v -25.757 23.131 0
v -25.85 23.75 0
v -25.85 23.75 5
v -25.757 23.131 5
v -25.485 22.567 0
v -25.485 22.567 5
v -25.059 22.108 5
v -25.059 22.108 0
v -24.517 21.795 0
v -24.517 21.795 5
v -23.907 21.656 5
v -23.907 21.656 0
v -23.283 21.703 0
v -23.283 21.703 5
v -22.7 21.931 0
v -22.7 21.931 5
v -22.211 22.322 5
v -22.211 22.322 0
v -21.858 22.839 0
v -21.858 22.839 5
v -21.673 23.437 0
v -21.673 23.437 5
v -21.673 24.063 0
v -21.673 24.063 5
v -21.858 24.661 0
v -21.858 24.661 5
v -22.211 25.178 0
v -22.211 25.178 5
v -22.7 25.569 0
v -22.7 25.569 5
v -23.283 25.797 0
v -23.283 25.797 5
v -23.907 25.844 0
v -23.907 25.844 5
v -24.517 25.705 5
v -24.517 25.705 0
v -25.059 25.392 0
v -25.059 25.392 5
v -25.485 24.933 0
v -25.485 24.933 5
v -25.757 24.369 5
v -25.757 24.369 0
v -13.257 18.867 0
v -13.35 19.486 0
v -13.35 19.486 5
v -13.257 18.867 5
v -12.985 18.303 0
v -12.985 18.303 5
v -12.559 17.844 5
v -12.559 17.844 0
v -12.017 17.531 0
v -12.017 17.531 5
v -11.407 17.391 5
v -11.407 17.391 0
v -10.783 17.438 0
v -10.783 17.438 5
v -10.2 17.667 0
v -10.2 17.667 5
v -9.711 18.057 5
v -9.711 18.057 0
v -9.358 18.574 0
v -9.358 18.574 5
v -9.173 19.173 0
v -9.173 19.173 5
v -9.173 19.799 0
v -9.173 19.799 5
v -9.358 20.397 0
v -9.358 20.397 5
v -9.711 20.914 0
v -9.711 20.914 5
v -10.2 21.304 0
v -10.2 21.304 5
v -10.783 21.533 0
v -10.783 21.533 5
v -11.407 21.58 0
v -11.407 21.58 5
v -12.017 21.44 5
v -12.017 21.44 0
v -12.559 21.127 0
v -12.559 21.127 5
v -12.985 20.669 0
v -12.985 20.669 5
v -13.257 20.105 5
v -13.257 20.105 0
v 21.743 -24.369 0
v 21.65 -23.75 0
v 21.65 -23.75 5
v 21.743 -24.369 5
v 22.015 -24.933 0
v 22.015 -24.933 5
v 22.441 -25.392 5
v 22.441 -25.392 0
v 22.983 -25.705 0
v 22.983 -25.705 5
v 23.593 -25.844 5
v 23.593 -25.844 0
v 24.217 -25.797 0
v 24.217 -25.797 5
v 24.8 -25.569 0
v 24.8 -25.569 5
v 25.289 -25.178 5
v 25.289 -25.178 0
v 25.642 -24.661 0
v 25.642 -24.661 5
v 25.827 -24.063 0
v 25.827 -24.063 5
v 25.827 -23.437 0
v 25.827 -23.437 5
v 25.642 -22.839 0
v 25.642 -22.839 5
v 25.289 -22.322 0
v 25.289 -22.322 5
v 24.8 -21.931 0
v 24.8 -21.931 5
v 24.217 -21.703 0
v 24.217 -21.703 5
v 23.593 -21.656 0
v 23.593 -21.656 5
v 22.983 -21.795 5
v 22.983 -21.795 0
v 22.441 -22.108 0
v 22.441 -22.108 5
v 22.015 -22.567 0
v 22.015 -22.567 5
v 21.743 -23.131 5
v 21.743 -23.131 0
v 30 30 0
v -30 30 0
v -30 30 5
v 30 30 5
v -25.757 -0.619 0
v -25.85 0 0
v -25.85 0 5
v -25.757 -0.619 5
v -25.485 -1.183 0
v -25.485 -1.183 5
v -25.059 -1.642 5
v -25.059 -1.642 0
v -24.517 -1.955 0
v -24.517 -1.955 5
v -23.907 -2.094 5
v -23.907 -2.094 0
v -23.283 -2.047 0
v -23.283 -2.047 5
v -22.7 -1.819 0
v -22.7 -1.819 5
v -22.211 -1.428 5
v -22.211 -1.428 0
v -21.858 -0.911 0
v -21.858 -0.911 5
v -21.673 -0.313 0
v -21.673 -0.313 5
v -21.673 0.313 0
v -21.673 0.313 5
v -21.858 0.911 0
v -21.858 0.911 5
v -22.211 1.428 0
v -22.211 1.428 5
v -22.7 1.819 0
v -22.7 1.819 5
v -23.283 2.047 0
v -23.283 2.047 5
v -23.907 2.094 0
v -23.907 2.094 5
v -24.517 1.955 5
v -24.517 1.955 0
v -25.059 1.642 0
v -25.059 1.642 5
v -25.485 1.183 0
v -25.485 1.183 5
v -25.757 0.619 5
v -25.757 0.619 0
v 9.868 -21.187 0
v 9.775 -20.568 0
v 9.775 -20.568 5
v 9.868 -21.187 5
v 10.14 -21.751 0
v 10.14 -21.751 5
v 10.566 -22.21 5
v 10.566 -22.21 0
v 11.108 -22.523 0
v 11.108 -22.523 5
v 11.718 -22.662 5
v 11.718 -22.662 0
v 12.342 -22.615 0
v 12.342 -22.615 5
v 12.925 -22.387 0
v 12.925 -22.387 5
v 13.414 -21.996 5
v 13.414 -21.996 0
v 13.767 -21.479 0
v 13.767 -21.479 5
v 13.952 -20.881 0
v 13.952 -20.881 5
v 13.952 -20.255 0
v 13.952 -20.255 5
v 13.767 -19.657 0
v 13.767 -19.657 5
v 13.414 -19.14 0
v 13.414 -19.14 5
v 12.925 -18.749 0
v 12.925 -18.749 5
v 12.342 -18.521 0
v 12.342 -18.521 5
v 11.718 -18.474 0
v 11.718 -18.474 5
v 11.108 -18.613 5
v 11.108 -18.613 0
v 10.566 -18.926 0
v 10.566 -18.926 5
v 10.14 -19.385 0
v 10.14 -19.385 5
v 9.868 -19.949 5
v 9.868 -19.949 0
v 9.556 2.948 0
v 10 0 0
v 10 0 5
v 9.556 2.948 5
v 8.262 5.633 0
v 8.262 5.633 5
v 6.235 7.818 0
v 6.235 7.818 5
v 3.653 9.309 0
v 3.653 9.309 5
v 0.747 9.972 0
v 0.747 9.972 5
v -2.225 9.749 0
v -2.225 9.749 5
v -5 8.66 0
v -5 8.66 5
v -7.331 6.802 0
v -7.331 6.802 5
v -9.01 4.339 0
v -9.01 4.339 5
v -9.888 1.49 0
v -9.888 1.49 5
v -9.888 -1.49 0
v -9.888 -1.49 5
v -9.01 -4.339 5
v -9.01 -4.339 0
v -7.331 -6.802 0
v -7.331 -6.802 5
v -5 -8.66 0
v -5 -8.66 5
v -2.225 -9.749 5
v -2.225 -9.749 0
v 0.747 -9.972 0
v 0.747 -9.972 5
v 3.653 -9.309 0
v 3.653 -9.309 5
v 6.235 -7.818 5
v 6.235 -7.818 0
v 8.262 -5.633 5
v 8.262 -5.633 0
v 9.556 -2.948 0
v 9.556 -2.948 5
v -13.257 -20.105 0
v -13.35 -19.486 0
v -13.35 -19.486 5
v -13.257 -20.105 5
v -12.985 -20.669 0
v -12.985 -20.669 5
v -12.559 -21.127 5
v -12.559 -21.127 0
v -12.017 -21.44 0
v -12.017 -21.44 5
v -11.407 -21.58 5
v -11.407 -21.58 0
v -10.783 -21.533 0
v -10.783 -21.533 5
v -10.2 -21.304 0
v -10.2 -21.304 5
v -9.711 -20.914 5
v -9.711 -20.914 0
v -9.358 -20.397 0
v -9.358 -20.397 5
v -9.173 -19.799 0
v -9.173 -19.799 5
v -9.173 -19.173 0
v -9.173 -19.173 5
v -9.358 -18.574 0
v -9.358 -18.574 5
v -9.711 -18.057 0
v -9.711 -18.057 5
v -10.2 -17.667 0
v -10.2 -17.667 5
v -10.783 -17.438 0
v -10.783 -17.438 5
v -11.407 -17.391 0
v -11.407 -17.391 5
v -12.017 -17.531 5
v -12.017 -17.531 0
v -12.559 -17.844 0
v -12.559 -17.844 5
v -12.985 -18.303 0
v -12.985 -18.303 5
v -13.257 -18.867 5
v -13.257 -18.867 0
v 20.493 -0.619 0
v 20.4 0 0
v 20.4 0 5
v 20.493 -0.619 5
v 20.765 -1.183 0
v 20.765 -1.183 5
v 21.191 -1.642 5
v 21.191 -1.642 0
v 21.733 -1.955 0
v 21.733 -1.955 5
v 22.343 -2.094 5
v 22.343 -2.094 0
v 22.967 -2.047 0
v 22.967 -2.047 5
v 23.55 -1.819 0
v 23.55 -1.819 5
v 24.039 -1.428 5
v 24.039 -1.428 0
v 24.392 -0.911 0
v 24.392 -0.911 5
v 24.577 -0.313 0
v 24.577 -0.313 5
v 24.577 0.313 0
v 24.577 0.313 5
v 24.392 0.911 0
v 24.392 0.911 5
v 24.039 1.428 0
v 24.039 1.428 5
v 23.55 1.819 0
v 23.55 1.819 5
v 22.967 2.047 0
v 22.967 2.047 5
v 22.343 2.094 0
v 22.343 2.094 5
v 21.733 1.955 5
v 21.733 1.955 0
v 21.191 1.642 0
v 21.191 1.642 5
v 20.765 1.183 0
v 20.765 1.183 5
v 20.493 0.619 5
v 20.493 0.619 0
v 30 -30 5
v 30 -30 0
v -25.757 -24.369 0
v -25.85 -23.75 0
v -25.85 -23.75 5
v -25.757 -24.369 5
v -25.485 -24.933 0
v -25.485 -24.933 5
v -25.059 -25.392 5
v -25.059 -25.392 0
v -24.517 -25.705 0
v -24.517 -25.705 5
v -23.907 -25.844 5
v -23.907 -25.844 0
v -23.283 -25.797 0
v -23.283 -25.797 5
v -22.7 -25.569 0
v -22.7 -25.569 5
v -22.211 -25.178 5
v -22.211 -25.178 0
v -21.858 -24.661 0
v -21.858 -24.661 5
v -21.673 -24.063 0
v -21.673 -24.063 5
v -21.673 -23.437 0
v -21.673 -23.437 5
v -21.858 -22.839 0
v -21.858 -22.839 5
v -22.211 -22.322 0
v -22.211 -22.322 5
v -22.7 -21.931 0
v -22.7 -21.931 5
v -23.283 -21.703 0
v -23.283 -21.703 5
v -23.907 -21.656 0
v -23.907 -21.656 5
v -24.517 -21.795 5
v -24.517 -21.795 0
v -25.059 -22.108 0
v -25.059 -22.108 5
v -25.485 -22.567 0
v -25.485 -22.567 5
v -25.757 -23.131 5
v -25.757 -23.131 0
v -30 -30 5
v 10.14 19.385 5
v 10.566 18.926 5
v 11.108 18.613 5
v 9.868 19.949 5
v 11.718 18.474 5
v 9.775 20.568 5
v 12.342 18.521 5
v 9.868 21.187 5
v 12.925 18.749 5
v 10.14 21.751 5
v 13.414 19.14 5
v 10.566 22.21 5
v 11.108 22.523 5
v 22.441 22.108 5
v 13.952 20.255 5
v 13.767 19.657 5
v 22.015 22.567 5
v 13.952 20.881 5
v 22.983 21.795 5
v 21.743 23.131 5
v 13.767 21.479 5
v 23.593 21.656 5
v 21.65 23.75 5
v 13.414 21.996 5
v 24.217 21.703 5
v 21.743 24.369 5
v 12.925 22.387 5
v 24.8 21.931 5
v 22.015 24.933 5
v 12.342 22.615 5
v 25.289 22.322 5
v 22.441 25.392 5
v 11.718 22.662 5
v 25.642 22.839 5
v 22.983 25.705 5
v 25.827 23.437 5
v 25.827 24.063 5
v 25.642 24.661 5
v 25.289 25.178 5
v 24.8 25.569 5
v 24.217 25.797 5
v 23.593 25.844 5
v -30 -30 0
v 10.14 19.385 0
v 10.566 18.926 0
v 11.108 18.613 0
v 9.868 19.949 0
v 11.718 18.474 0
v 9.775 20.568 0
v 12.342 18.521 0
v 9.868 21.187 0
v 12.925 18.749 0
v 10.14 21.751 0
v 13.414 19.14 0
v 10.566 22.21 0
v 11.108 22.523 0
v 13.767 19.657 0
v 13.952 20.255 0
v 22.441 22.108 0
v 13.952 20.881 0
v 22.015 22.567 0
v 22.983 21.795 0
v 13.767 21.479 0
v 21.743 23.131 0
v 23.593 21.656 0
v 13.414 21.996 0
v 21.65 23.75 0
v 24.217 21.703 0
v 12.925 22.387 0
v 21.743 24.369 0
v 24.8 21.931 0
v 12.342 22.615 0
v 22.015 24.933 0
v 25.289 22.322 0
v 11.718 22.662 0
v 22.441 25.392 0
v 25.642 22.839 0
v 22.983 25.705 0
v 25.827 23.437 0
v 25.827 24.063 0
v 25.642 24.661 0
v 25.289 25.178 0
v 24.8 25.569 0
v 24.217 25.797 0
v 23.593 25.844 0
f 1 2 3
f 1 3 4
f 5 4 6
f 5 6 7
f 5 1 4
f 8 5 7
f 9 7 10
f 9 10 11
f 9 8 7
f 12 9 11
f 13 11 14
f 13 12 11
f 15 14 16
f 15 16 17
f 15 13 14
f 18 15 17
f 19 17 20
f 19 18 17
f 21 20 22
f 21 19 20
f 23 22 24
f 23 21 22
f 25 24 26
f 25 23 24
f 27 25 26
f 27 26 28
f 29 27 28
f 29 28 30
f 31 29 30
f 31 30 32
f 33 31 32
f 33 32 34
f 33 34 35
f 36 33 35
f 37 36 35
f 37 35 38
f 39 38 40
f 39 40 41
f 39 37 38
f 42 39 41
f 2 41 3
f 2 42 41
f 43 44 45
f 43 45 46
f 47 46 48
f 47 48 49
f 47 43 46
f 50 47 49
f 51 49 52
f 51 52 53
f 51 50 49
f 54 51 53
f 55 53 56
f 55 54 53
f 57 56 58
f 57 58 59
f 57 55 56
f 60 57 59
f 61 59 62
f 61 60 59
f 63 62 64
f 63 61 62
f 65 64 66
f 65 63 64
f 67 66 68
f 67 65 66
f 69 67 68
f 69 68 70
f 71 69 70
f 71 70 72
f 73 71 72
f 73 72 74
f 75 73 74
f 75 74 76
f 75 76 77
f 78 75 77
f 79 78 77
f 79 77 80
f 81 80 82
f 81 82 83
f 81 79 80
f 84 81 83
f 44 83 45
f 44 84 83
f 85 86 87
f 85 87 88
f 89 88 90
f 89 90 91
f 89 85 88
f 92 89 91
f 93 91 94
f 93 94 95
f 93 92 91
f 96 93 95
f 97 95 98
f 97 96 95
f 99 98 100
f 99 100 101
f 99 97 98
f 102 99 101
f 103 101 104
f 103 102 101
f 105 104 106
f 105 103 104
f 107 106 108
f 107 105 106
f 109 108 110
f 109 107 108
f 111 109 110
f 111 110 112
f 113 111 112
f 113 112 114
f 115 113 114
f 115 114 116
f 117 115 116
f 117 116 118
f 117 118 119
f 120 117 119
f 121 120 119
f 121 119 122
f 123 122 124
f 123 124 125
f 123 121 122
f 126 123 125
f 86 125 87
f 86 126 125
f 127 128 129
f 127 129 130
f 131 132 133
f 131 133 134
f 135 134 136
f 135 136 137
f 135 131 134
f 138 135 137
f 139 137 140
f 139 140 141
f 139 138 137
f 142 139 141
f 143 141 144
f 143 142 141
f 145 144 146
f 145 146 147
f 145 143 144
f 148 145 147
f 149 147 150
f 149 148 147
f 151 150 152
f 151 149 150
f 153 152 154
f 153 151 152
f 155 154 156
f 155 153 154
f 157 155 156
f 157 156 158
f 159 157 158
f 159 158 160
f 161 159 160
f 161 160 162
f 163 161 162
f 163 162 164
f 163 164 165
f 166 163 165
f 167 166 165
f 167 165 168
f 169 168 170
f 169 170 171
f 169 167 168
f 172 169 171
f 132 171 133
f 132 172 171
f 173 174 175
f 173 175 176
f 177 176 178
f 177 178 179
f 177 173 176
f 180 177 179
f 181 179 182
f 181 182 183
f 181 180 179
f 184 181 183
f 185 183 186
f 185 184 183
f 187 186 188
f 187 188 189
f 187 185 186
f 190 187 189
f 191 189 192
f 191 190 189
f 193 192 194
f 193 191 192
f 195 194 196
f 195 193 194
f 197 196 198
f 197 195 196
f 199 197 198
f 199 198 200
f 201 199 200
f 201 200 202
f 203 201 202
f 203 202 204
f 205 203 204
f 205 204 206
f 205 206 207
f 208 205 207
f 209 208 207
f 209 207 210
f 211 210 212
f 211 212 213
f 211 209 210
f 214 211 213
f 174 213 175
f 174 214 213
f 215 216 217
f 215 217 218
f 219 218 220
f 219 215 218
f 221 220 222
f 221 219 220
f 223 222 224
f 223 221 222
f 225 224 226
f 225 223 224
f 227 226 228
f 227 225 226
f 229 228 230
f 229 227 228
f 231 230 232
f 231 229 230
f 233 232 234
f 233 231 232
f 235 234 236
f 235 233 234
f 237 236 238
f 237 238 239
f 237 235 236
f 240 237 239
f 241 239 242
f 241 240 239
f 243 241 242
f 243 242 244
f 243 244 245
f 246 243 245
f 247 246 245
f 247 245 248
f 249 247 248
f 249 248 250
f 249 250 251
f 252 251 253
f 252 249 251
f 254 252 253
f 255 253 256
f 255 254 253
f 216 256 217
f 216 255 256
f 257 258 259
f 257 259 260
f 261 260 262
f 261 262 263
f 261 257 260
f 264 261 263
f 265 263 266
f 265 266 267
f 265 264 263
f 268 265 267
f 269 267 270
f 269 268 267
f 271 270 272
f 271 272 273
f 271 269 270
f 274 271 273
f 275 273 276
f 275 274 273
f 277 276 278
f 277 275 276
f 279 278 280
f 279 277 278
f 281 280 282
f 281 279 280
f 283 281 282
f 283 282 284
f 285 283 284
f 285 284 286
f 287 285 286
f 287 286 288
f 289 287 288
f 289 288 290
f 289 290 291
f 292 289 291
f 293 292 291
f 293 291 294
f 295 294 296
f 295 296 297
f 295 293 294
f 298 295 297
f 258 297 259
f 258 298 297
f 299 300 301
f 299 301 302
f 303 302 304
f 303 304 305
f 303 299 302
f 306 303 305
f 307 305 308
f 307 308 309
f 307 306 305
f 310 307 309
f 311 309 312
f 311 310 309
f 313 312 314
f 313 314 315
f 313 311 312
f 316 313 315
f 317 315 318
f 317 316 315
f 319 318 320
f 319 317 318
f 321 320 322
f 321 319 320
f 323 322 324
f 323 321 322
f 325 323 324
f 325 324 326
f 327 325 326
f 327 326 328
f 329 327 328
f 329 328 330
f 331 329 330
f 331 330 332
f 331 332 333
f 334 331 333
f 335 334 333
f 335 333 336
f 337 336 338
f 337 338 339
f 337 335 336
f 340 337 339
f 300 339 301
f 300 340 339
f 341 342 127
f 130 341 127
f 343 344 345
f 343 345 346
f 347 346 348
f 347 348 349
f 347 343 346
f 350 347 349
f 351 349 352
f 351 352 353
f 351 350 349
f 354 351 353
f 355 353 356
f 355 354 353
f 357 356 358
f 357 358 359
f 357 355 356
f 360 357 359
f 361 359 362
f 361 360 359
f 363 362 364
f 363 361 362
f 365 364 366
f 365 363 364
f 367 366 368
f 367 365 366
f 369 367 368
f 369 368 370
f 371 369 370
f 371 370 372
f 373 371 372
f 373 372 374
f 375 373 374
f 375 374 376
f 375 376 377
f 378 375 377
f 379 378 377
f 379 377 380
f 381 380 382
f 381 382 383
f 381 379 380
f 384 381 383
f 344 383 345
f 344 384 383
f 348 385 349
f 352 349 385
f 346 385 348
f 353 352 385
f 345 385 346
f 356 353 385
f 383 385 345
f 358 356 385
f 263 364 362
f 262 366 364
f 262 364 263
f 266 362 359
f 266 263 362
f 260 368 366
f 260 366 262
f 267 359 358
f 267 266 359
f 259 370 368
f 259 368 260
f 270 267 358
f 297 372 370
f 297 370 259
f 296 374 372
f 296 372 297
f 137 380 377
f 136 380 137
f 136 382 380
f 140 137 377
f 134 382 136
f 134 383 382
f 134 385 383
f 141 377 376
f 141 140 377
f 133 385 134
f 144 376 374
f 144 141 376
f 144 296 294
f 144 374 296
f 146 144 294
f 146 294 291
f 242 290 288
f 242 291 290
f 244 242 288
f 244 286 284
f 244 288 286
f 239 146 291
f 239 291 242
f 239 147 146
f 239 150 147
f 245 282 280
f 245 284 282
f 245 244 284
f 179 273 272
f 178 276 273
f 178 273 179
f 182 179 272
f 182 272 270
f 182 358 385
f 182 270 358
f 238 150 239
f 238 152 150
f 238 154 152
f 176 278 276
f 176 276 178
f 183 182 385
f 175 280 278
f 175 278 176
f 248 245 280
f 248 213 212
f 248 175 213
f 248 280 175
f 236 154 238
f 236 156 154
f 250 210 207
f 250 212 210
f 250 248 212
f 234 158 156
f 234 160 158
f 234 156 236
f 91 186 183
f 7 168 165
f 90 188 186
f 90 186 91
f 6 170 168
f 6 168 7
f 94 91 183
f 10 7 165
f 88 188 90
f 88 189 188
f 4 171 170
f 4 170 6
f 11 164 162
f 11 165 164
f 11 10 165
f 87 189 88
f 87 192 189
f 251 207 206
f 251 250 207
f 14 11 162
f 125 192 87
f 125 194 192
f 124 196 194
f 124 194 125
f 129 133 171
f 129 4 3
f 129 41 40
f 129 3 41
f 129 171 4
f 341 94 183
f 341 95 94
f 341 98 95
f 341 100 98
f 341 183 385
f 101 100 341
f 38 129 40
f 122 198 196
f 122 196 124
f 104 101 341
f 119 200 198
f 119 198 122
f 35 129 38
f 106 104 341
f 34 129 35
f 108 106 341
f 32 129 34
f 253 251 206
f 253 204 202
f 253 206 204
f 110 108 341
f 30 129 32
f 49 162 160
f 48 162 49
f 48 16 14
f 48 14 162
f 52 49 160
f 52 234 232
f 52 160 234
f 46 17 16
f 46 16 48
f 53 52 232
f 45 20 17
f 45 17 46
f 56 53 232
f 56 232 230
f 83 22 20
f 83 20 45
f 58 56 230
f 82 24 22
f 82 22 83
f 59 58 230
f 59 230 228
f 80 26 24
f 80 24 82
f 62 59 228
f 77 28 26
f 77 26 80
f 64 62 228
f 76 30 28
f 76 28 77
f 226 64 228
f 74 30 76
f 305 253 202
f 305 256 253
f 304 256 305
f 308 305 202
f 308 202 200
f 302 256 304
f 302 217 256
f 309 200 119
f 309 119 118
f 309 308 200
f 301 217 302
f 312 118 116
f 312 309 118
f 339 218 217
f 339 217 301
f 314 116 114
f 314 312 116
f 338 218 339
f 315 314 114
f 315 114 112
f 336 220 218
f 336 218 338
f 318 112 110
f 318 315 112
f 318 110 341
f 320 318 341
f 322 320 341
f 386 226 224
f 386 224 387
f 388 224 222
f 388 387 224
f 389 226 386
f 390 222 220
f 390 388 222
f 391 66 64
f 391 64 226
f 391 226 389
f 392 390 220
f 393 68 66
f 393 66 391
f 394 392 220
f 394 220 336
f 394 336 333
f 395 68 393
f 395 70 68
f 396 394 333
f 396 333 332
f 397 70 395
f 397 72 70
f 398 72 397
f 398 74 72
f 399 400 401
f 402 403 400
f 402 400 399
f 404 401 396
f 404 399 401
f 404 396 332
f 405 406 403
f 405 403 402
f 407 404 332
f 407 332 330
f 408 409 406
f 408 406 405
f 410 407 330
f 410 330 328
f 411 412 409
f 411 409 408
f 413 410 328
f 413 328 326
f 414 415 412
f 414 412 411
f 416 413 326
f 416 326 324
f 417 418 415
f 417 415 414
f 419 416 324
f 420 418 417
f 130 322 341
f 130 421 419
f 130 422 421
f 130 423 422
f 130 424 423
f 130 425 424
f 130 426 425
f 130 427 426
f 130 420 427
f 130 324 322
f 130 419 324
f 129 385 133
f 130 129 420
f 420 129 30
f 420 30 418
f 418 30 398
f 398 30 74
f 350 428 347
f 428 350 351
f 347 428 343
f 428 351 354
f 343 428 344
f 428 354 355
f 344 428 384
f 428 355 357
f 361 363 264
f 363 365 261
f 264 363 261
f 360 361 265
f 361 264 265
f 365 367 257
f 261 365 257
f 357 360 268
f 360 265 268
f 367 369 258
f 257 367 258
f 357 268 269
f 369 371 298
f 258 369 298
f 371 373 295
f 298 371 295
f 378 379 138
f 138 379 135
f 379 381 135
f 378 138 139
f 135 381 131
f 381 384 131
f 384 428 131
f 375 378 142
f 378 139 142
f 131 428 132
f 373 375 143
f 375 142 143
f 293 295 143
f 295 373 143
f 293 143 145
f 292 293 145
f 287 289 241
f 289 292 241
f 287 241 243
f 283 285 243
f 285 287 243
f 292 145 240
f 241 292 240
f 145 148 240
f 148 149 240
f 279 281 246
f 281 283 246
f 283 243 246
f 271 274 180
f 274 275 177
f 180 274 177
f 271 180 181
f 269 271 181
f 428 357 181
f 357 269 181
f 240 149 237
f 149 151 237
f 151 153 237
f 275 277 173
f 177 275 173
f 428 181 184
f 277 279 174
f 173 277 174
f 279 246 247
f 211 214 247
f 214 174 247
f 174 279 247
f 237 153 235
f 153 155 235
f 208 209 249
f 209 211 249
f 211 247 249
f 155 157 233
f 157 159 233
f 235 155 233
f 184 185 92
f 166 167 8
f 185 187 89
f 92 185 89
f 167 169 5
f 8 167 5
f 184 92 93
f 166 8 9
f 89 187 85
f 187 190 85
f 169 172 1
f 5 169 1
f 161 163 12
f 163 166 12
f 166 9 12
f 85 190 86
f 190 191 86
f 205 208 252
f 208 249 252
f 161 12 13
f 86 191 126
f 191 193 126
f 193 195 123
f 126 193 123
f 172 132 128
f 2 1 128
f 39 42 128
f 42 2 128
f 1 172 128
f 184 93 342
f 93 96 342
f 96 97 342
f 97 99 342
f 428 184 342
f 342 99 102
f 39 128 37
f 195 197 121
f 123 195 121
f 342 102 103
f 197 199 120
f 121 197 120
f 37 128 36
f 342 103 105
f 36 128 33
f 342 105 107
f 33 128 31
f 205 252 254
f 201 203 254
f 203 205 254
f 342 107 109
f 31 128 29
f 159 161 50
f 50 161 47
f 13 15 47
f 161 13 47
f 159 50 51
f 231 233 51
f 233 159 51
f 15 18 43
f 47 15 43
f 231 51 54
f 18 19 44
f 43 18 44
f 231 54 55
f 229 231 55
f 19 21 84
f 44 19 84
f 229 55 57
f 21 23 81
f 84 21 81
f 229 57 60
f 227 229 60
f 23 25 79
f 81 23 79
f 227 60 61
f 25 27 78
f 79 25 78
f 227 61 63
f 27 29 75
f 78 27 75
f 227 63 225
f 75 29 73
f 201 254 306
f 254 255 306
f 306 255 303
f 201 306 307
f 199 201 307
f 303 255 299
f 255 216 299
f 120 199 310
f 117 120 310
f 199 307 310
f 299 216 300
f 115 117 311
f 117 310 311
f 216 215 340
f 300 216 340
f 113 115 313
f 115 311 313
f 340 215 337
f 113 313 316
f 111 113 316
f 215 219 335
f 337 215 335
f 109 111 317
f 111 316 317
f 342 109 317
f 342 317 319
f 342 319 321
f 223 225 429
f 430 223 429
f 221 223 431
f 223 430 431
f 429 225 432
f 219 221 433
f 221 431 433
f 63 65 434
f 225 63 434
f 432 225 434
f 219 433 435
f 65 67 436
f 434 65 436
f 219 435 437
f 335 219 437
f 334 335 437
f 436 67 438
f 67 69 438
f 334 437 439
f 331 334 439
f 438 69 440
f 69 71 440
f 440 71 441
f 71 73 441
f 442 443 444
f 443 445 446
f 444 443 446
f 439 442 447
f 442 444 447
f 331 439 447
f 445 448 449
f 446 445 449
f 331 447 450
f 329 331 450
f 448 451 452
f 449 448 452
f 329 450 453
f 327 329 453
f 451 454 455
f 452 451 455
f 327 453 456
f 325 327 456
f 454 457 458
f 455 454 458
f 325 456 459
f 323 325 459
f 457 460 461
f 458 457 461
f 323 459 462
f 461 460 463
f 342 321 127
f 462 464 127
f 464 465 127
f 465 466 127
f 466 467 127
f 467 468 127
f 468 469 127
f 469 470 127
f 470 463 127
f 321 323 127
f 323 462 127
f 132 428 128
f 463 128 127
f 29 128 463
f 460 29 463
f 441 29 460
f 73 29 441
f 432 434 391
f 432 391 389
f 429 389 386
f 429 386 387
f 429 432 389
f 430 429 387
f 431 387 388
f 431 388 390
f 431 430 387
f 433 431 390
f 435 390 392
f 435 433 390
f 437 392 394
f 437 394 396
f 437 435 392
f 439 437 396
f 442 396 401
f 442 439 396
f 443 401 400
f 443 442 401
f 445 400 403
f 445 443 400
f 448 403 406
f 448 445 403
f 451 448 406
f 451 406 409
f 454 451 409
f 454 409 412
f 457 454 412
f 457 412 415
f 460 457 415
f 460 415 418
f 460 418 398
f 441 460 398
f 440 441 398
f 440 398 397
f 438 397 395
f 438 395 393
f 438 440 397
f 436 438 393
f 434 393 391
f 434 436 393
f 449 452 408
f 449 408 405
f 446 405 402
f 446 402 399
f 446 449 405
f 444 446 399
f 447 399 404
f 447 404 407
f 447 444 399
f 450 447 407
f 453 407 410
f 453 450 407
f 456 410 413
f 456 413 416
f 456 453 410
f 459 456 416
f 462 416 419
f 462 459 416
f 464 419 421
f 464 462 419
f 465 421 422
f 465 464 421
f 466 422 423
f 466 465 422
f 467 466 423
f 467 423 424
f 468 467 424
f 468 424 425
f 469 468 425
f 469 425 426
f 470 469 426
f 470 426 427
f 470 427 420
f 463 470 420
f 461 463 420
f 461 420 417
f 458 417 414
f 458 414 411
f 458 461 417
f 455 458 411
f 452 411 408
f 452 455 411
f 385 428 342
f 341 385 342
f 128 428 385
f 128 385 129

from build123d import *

# Parameters (mm, degrees)
SKETCH_3_W          = 60
SKETCH_3_H          = 60
SKETCH_3_R          = 10
EXTRUDE_2_DEPTH     = 5
SKETCH_4_R          = 2.1
CUT_EXTRUDE_1_DEPTH = 5


with BuildPart() as part:
    # 草图3 → 凸台-拉伸2 (new body)
    with BuildSketch(Plane.XY):
        Rectangle(SKETCH_3_W, SKETCH_3_H)
        Circle(SKETCH_3_R, mode=Mode.SUBTRACT)
    extrude(amount=EXTRUDE_2_DEPTH)

    # 草图4 → 切除-拉伸1 (cut)
    with BuildSketch(Plane.XY):
        with Locations(Location((11.875, 20.56810334, 0), (0, 0, 180))):
            Circle(SKETCH_4_R)
        with Locations(Location((22.5, 0, 0), (0, 0, 180))):
            Circle(SKETCH_4_R)
        with Locations(Location((11.875, -20.56810334, 0), (0, 0, 180))):
            Circle(SKETCH_4_R)
        with Locations(Location((-11.25, -19.485571585, 0), (0, 0, 180))):
            Circle(SKETCH_4_R)
        with Locations(Location((-23.75, 0, 0), (0, 0, 180))):
            Circle(SKETCH_4_R)
        with Locations(Location((-11.25, 19.485571585, 0), (0, 0, 180))):
            Circle(SKETCH_4_R)
        with Locations(Location((-23.75, 23.75, 0), (0, 0, 180))):
            Circle(SKETCH_4_R)
        with Locations(Location((23.75, 23.75, 0), (0, 0, 180))):
            Circle(SKETCH_4_R)
        with Locations(Location((23.75, -23.75, 0), (0, 0, 180))):
            Circle(SKETCH_4_R)
        with Locations(Location((-23.75, -23.75, 0), (0, 0, 180))):
            Circle(SKETCH_4_R)
    extrude(amount=CUT_EXTRUDE_1_DEPTH, mode=Mode.SUBTRACT)


solid = part.part
